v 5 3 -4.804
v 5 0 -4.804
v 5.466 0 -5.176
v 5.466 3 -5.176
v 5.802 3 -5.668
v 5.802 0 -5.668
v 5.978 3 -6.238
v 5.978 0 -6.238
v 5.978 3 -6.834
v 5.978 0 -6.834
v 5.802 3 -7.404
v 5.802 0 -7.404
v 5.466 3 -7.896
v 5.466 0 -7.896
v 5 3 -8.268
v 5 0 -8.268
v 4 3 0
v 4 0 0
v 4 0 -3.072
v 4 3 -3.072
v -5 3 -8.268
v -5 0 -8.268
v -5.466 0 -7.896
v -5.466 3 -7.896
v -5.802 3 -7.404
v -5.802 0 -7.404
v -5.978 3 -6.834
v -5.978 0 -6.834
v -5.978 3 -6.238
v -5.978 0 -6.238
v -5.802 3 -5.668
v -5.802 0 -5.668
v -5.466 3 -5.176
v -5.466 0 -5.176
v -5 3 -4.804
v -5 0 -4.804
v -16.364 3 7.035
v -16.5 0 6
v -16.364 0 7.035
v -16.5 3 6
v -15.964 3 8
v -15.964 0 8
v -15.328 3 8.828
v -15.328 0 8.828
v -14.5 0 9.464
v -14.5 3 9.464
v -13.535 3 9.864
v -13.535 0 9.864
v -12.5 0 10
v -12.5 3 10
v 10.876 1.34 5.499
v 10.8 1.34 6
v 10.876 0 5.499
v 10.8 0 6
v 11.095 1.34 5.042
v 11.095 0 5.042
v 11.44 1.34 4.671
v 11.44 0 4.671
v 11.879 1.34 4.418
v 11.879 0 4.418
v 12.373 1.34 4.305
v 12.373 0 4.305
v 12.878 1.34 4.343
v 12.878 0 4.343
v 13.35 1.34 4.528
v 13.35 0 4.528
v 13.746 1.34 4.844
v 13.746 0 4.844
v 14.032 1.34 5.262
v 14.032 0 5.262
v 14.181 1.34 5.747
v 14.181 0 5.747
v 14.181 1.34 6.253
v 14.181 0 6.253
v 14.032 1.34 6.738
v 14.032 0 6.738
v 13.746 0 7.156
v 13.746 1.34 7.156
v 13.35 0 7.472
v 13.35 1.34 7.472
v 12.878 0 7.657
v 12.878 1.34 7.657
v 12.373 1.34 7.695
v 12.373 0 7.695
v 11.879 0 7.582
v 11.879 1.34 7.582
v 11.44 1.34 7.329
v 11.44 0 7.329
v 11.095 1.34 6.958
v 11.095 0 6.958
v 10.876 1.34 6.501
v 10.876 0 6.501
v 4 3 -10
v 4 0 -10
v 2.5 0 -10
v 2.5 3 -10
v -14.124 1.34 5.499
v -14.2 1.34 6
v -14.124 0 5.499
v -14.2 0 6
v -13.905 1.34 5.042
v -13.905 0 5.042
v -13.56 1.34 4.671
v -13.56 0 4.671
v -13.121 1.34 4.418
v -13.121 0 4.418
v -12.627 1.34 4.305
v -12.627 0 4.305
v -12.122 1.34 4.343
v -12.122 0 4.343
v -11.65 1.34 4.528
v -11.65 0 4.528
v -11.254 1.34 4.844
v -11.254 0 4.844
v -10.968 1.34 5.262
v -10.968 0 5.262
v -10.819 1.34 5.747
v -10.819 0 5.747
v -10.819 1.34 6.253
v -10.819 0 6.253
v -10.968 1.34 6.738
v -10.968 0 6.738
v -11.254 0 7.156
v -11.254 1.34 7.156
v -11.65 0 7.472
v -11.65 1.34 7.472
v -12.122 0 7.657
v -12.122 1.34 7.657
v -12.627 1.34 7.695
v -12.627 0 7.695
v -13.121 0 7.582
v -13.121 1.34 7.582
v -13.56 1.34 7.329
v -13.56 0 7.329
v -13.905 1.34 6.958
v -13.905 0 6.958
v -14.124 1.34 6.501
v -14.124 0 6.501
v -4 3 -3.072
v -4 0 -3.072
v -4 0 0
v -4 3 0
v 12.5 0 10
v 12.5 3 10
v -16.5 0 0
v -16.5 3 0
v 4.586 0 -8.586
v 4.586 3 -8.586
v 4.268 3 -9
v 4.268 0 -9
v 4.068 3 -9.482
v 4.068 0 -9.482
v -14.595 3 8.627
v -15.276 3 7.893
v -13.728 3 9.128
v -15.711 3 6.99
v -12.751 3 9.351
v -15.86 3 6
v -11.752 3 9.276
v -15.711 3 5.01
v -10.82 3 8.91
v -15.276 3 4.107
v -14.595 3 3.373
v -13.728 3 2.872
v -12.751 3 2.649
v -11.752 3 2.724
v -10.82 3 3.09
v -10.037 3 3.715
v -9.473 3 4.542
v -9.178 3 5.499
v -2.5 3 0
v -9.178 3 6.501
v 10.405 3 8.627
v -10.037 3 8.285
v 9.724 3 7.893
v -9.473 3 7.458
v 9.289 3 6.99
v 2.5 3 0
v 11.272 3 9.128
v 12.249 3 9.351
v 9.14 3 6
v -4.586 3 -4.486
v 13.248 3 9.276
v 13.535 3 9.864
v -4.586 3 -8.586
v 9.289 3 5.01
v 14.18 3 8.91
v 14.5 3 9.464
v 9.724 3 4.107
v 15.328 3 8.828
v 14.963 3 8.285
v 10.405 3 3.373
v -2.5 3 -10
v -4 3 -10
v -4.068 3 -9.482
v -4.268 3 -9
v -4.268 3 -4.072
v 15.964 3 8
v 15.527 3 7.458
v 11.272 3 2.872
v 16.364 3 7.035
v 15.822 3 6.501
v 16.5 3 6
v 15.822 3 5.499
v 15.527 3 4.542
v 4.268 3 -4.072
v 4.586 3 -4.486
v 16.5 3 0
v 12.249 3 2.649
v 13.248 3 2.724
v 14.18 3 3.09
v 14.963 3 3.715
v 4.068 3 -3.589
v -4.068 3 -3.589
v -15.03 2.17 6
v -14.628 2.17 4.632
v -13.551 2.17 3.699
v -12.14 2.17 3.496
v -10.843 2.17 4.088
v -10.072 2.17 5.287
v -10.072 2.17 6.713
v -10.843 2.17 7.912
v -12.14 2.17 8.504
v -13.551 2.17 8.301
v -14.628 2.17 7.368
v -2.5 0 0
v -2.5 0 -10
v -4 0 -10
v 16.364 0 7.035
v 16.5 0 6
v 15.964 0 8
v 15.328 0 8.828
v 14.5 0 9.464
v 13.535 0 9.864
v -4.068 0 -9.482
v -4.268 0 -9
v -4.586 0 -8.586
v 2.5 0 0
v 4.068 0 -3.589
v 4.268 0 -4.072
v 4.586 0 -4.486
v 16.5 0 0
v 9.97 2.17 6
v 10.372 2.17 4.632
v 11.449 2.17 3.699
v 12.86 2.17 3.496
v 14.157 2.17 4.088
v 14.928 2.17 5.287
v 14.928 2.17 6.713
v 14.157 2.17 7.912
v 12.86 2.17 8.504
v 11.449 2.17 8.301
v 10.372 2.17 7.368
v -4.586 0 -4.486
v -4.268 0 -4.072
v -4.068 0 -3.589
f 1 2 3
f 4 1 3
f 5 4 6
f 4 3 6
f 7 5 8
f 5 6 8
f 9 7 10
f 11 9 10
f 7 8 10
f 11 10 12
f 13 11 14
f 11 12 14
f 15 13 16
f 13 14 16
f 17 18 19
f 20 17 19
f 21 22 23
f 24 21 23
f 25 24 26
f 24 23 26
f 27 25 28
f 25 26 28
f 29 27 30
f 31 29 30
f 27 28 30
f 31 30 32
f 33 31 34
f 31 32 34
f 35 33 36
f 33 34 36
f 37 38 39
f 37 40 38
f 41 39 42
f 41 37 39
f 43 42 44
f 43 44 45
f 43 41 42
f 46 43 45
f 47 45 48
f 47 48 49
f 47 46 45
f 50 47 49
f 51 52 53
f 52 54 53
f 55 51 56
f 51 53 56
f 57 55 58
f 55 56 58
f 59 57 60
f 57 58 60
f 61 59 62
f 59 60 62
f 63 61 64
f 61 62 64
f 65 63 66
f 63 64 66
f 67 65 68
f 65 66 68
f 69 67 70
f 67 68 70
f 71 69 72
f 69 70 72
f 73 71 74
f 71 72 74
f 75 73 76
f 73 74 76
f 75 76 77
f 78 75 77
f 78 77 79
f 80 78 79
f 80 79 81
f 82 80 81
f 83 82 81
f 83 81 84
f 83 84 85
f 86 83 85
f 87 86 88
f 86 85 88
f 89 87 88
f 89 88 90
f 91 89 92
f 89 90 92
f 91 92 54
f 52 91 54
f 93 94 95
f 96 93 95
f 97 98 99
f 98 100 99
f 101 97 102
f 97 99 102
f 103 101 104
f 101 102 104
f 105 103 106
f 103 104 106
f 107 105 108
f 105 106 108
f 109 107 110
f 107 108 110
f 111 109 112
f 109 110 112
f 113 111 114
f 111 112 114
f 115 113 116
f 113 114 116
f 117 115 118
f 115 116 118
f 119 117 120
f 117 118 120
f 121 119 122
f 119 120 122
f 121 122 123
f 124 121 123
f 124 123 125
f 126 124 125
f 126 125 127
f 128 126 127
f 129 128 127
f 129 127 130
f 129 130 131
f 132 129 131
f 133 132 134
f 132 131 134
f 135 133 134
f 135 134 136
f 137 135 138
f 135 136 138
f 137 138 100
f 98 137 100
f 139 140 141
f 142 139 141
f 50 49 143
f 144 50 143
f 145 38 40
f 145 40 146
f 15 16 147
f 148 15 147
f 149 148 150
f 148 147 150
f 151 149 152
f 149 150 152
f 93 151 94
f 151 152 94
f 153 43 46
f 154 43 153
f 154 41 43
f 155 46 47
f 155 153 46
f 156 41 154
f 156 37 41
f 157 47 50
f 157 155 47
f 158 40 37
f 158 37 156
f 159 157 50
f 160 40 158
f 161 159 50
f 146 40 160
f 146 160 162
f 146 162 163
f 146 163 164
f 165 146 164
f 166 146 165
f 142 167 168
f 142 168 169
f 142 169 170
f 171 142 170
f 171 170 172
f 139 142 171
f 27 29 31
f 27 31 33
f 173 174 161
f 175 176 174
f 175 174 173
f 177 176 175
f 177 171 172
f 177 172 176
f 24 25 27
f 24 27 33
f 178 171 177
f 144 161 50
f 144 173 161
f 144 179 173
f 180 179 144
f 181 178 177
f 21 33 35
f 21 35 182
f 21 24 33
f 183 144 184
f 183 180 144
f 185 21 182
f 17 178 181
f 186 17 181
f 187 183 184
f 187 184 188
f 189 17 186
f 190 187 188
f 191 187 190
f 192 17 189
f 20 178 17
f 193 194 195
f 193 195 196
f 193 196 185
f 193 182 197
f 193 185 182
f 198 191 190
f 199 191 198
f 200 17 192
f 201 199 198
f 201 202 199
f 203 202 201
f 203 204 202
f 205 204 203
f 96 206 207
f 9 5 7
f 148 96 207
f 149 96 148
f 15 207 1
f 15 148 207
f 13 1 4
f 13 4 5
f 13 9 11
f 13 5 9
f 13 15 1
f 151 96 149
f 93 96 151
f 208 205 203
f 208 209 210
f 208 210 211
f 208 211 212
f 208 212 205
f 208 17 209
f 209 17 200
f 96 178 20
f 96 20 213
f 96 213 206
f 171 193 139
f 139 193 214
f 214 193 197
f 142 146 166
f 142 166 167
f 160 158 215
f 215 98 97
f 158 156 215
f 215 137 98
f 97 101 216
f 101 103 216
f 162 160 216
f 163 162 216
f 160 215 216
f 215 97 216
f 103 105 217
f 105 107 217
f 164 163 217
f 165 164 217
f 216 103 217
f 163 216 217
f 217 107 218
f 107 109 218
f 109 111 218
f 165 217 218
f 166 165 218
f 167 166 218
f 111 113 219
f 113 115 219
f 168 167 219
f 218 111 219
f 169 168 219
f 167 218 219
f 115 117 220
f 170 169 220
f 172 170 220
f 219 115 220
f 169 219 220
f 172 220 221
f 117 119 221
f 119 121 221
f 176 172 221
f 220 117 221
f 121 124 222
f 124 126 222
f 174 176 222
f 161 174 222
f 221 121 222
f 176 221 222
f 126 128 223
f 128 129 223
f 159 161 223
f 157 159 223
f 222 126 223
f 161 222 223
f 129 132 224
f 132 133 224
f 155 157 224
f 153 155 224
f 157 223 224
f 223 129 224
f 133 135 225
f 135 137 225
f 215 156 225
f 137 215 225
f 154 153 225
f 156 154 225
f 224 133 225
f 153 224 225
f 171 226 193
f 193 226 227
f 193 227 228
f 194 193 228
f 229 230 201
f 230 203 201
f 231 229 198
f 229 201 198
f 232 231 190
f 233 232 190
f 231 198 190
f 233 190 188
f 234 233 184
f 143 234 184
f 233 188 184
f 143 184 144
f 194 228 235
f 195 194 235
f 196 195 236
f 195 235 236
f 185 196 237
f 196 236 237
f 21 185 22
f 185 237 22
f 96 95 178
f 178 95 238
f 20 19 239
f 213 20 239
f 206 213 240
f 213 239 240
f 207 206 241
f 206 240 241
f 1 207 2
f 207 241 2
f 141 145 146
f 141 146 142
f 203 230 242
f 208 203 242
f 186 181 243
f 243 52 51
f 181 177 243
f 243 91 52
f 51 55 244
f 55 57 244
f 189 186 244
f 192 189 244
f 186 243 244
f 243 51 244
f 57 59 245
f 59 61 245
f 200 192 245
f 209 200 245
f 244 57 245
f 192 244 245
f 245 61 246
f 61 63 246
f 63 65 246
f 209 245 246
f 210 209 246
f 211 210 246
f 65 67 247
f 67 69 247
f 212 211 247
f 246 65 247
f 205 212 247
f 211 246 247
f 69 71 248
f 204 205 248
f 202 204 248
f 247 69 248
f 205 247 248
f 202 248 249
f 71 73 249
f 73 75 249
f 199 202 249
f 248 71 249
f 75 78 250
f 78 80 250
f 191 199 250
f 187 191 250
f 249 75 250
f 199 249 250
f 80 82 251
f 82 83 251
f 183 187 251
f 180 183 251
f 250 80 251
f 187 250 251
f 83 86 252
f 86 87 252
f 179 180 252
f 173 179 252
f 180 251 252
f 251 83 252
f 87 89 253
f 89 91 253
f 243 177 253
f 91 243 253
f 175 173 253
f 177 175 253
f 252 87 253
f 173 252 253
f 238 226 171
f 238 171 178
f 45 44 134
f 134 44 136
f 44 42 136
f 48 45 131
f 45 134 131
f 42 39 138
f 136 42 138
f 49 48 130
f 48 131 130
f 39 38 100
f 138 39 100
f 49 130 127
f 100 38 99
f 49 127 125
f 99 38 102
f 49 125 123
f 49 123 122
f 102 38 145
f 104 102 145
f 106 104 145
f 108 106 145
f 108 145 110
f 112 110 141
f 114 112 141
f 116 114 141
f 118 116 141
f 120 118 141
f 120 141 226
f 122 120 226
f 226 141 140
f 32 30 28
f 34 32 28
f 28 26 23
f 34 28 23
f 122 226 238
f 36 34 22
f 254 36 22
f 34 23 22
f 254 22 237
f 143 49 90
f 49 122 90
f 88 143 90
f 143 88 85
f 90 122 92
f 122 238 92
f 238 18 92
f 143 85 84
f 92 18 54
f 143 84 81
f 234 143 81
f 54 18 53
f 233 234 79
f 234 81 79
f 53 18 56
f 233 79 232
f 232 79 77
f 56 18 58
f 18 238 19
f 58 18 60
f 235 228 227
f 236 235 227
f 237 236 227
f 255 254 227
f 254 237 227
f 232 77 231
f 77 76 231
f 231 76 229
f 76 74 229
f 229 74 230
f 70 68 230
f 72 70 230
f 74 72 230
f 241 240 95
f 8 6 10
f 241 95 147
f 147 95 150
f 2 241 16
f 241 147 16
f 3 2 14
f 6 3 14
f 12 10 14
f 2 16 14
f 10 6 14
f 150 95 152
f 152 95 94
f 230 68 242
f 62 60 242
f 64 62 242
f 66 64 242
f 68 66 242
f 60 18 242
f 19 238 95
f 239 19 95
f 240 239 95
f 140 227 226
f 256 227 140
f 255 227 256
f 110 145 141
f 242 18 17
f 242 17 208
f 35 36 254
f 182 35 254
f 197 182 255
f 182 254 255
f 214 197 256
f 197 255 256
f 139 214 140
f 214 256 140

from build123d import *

# Parameters (mm, degrees)
SKETCH1_W                     = 33
SKETCH1_H                     = 10
BOSS_EXTRUDE1_DEPTH           = 3
CSK_FOR_M3_SFHCS1_D           = 3.4
CSK_FOR_M3_SFHCS1_DEPTH       = 10
CSK_FOR_M3_SFHCS1_CSINK_D     = 6.72
CSK_FOR_M3_SFHCS1_CSINK_ANGLE = 90
CSK_FOR_M3_SFHCS1_TIP         = 1.021463052
FILLET1_R                     = 4


with BuildPart() as part:
    # Sketch1 → Boss-Extrude1 (new body)
    with BuildSketch(Plane(origin=(0, 0, 0), x_dir=(1, 0, 0), z_dir=(0, 1, 0))):
        with Locations((0, -5)):
            Rectangle(SKETCH1_W, SKETCH1_H)
        with BuildLine():
            Line((-4, 0), (-2.5, 0))
            Line((-2.5, 0), (-2.5, 10))
            Line((-2.5, 10), (-4, 10))
            ThreePointArc((-4, 10), (-4.267949192, 9), (-5, 8.267949192))
            ThreePointArc((-5, 8.267949192), (-6, 6.535898385), (-5, 4.803847577))
            ThreePointArc((-5, 4.803847577), (-4.267949192, 4.07179677), (-4, 3.07179677))
            Line((-4, 3.07179677), (-4, 0))
        make_face()
        with BuildLine():
            Line((2.5, 10), (2.5, 0))
            Line((2.5, 0), (4, 0))
            Line((4, 0), (4, 3.07179677))
            ThreePointArc((4, 3.07179677), (4.267949192, 4.07179677), (5, 4.803847577))
            ThreePointArc((5, 4.803847577), (6, 6.535898385), (5, 8.267949192))
            ThreePointArc((5, 8.267949192), (4.267949192, 9), (4, 10))
            Line((4, 10), (2.5, 10))
        make_face()
    extrude(amount=BOSS_EXTRUDE1_DEPTH)

    # CSK for M3 SFHCS1
    with Locations(Plane(origin=(0, 3, 0), x_dir=(1, 0, 0), z_dir=(0, 1, 0))):
        with Locations((-12.5, -6), (12.5, -6)):
            CounterSinkHole(CSK_FOR_M3_SFHCS1_D / 2, CSK_FOR_M3_SFHCS1_CSINK_D / 2, depth=CSK_FOR_M3_SFHCS1_DEPTH, counter_sink_angle=CSK_FOR_M3_SFHCS1_CSINK_ANGLE)
            with Locations((0, 0, -(CSK_FOR_M3_SFHCS1_DEPTH + CSK_FOR_M3_SFHCS1_TIP / 2))):  # 118° drill point
                Cone(0, CSK_FOR_M3_SFHCS1_D / 2, CSK_FOR_M3_SFHCS1_TIP, mode=Mode.SUBTRACT)

    # Fillet1
    fillet1_edges = [part.edges().sort_by_distance(p)[0] for p in [
        (16.5, 1.5, 10),
        (-16.5, 1.5, 10),
    ]]
    fillet(fillet1_edges, radius=FILLET1_R)


solid = part.part
